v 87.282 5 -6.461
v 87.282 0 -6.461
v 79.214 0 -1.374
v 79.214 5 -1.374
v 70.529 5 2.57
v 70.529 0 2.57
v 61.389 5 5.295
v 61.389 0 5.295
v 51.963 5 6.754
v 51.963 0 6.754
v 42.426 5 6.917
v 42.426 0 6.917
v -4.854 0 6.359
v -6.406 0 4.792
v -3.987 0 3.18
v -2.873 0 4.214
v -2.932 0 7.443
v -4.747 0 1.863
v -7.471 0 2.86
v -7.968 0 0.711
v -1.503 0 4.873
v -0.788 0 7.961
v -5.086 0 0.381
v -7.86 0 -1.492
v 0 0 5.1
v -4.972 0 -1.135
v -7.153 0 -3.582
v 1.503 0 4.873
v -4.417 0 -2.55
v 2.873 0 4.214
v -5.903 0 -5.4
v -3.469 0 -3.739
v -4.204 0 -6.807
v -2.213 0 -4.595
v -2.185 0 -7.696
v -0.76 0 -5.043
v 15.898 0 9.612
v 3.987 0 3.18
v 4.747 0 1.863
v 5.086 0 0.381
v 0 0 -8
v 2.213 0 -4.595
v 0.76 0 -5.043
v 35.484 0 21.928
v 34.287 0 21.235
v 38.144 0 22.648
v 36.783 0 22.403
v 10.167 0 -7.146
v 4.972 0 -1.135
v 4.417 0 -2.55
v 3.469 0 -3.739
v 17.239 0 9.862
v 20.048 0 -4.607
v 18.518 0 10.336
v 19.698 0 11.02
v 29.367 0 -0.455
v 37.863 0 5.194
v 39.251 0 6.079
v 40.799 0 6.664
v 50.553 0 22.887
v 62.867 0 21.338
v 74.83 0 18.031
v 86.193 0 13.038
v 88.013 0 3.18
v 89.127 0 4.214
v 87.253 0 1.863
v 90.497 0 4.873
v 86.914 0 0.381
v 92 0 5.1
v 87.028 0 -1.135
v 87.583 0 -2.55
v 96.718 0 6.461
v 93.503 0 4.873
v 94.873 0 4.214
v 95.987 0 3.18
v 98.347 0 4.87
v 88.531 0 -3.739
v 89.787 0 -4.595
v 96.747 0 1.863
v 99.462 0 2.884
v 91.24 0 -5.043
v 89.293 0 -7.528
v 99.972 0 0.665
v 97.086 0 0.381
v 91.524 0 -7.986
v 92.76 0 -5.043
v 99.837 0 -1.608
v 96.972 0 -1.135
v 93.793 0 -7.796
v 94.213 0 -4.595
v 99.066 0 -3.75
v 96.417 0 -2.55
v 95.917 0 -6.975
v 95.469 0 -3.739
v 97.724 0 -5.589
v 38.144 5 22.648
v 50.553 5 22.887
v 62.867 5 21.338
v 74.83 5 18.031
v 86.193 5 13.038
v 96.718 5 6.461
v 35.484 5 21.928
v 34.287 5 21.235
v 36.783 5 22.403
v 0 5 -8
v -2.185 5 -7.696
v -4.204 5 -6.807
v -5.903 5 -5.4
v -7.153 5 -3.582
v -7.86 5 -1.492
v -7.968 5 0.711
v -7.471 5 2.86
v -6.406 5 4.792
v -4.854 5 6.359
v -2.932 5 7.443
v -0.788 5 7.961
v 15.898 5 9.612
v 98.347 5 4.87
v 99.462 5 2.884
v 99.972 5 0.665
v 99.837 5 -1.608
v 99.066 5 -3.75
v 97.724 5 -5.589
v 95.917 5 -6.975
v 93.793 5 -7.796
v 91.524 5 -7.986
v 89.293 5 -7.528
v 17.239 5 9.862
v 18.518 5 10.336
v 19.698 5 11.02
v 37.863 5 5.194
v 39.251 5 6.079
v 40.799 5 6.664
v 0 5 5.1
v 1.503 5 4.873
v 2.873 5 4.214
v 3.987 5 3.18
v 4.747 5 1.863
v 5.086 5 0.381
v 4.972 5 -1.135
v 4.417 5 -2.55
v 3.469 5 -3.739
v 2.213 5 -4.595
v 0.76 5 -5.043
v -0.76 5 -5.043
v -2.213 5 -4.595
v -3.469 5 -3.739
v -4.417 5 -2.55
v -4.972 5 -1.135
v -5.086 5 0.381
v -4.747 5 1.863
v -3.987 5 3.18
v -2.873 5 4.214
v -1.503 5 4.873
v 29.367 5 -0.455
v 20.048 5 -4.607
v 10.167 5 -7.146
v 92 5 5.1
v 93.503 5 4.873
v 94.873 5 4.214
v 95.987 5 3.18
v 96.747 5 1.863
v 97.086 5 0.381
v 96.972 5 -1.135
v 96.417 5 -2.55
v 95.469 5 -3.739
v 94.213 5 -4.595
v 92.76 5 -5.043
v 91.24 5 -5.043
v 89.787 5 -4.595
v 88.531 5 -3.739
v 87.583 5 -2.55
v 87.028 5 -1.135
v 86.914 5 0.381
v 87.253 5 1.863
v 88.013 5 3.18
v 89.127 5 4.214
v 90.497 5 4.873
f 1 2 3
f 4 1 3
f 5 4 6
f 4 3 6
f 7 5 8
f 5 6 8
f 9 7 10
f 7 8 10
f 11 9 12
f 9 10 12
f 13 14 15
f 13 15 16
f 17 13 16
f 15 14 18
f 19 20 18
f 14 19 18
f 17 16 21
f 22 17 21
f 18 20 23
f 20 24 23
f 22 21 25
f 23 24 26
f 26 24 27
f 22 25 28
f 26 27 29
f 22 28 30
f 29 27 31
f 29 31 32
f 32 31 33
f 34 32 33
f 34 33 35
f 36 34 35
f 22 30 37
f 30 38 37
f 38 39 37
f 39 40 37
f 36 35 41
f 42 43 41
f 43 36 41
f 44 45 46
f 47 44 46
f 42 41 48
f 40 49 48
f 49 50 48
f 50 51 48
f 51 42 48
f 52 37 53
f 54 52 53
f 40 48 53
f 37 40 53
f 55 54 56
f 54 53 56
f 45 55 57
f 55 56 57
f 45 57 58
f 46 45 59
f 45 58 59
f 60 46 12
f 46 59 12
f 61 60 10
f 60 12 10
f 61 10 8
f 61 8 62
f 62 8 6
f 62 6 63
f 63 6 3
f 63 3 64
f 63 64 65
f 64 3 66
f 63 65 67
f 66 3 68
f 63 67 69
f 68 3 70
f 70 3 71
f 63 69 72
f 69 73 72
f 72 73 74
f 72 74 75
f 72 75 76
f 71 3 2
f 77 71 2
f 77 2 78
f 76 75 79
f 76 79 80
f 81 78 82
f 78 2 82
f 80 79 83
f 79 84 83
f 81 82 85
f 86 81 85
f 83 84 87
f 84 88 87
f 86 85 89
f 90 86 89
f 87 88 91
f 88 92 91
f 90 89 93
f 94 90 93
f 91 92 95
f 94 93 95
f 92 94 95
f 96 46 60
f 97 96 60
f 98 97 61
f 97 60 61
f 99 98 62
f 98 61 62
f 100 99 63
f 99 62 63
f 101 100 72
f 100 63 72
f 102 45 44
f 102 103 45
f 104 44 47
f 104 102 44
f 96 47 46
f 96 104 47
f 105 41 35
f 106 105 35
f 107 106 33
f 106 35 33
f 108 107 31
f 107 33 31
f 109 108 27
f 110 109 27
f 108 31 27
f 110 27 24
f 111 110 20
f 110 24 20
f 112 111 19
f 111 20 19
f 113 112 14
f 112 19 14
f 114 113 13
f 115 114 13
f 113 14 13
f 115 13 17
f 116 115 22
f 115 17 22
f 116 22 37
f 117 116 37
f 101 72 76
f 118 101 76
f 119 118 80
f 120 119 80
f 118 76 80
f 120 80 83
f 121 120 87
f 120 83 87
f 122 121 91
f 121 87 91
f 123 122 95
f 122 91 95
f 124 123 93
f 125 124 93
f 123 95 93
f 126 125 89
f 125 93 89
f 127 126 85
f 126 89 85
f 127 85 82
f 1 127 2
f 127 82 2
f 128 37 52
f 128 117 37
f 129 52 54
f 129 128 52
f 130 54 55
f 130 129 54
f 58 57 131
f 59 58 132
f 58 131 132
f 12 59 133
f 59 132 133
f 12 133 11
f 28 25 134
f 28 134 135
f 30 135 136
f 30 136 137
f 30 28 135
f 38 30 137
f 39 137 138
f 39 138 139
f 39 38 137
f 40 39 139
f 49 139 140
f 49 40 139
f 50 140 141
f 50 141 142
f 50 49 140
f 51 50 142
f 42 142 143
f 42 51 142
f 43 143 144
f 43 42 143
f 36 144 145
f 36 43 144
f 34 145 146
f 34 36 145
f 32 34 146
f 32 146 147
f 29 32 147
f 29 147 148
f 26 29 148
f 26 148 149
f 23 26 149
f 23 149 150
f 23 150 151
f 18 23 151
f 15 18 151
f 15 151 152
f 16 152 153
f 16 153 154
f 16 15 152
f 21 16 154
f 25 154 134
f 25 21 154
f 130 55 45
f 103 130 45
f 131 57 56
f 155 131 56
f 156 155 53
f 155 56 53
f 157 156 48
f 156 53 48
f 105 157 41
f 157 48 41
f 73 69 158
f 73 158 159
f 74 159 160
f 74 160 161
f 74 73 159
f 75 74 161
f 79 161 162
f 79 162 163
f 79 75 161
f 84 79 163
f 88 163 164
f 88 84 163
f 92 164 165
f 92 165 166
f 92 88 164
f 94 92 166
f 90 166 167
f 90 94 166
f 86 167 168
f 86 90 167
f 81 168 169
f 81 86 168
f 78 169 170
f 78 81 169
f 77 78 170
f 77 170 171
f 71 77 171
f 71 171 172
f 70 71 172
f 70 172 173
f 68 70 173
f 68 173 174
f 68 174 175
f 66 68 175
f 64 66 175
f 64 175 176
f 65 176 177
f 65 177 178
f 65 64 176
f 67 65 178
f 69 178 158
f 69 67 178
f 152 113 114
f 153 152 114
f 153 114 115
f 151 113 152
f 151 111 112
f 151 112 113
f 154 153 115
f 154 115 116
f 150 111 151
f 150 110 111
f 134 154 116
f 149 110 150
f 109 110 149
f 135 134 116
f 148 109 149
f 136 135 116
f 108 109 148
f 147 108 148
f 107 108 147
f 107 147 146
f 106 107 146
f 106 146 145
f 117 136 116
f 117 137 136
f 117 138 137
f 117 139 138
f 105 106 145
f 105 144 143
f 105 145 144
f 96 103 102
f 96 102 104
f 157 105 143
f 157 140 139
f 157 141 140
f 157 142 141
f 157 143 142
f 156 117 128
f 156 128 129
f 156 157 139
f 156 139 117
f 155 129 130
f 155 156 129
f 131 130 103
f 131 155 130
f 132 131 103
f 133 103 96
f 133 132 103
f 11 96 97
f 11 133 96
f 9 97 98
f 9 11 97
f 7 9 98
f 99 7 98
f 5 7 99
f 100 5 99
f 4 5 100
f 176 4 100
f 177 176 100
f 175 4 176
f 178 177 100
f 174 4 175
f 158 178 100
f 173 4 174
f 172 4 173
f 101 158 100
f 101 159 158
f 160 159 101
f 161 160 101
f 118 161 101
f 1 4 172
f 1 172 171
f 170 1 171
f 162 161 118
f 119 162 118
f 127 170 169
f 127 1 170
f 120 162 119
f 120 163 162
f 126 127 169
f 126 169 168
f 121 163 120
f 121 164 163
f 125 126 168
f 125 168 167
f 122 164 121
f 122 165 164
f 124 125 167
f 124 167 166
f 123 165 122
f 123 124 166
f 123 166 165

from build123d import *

# Parameters (mm, degrees)
SKETCH_1_R      = 5.1
EXTRUDE_1_DEPTH = 5
FILLET_1_R      = 8


with BuildPart() as part:
    # 草图1 → 凸台-拉伸1 (new body)
    with BuildSketch(Plane(origin=(0, 0, 0), x_dir=(1, 0, 0), z_dir=(0, 1, 0))):
        with BuildLine():
            Line((-0.787870548, -7.961109219), (17.98227334, -9.818695034))
            Line((17.98227334, -9.818695034), (35.982367897, -22.422496932))
            ThreePointArc((35.982367897, -22.422496932), (67.859174016, -20.183513419), (96.717948718, -6.460724409))
            ThreePointArc((96.717948718, -6.460724409), (98.460724409, 4.717948718), (87.282051282, 6.460724409))
            ThreePointArc((87.282051282, 6.460724409), (64.699919143, -4.463945073), (39.716178923, -6.725320727))
            ThreePointArc((39.716178923, -6.725320727), (21.179057691, 4.200169373), (0, 8))
            ThreePointArc((0, 8), (-7.990271389, 0.394414913), (-0.787870548, -7.961109219))
        make_face()
        with Locations(Location((0, 0, 0), (0, 0, 270))):
            Circle(SKETCH_1_R, mode=Mode.SUBTRACT)
        with Locations(Location((92, 0, 0), (0, 0, 270))):
            Circle(SKETCH_1_R, mode=Mode.SUBTRACT)
    extrude(amount=EXTRUDE_1_DEPTH)

    # 圆角1
    fillet_1_edges = [part.edges().sort_by_distance(p)[0] for p in [
        (39.716178923, 2.5, 6.725320727),
        (35.982367897, 2.5, 22.422496932),
        (17.98227334, 2.5, 9.818695034),
    ]]
    fillet(fillet_1_edges, radius=FILLET_1_R)


solid = part.part
